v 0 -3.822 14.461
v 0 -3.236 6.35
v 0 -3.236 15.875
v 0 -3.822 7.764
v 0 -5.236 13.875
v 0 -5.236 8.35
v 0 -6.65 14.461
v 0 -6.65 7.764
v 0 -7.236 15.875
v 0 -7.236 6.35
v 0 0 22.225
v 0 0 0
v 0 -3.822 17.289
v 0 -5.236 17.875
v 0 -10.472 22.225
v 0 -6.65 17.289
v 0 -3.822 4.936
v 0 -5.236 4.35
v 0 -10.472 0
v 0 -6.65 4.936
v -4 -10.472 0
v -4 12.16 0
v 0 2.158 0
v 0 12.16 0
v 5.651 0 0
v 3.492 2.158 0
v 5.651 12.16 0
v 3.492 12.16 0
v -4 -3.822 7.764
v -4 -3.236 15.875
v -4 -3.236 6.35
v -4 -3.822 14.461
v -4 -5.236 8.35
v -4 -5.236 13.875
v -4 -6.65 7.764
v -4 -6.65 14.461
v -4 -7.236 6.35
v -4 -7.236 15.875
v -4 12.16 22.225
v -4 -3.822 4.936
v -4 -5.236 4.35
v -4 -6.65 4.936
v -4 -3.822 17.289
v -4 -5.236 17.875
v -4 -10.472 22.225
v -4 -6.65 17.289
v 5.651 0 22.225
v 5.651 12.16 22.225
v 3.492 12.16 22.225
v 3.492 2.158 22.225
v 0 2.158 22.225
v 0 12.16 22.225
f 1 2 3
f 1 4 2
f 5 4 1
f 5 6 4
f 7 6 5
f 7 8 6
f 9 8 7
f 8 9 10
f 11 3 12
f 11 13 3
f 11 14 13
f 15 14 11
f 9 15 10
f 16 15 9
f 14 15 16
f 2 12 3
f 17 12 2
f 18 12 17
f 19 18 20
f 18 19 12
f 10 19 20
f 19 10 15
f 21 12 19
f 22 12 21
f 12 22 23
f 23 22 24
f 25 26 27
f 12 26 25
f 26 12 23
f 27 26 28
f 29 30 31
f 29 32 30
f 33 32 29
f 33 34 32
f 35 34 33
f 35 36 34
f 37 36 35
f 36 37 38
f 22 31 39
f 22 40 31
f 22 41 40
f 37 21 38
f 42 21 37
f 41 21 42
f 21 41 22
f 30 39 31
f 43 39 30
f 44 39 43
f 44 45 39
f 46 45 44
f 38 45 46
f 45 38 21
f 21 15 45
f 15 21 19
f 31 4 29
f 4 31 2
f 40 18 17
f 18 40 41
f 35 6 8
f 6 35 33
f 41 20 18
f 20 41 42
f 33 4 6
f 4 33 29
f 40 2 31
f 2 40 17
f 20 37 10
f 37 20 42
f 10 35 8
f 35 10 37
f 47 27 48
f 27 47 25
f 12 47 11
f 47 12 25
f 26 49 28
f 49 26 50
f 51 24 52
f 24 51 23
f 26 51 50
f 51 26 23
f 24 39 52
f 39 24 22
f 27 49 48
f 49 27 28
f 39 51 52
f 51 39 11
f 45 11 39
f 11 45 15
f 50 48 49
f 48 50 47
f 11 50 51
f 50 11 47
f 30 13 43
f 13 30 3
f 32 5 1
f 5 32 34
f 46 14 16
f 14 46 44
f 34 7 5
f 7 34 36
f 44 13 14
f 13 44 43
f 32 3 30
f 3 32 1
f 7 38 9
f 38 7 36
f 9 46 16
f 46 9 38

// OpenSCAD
joinfactor = 0.125;
goldenratio = 1.61803399;

gMaterialThickness = 1/8*25.4;
gMaterialWidth = 3/4*25.4;

gSleeveLength = 1/2*25.4;

gMountRadius = 2;
gMountWidth = gMountRadius*2*goldenratio*goldenratio;
gMountThickness = 4;

//MountTab(gMountThickness, gMountWidth, gSleeveLength, gMountRadius);
//StraightBlank(gMaterialThickness, gMaterialWidth, 1/2*25.4);
//StraightMount(gMaterialThickness, gMaterialWidth, 1/2*25.4, mountgap=3);
//StraightSlipFit(gMaterialThickness, gMaterialWidth, 1/2*25.4, mountgap=3);
//StraightCap(gMaterialThickness, gMaterialWidth, 1/2*25.4, mountgap=3);

//StraightClip(gMaterialThickness, gMaterialWidth, 1/2*25.4, mountgap=3,clipratio=0.5);
StraightRail(gMaterialThickness, gMaterialWidth, 1/2*25.4, mountgap=3,clipratio=0.5);

//=====================================
// Modules
//=====================================

module MountTab(thickness, width, length, radius)
{
	difference()
	{
		cube(size=[thickness, width, length]);
		
		translate([-joinfactor, width/2, length/2])
		rotate([0, 90, 0])
		cylinder(r=radius, h=thickness+2*joinfactor, $fn=8);
	}
}

module StraightBlank(thickness, width, length)
{
	cube(size=[thickness, width, length]);
}

module StraightMount(thickness, width, length, mountgap=3)
{
	InnerThickness = thickness*1.1;
	InnerWidth = width * 1.02;

	OuterThickness = InnerThickness*goldenratio;
	wallthickness = (OuterThickness - InnerThickness);
	OuterWidth = InnerWidth +wallthickness*2;


	union()
	{
		StraightBlank(OuterThickness, OuterWidth, length);
	
		// Add a straight gap that presses against the wall
		translate([-gMountThickness, -joinfactor, 0])
		cube(size=[gMountThickness, OuterWidth+2*joinfactor, length]);
	
		// Add the mounting tabs
		translate([-gMountThickness, OuterWidth, 0])
		MountTab(gMountThickness, gMountWidth, gSleeveLength, gMountRadius);
	
		translate([-gMountThickness, -gMountWidth, 0])
		MountTab(gMountThickness, gMountWidth, gSleeveLength, gMountRadius);
	}
}

module StraightSlipFit(thickness, width, length, mountgap=3)
{
	InnerThickness = thickness*1.1;
	InnerWidth = width * 1.05;

	OuterThickness = InnerThickness*goldenratio;
	wallthickness = (OuterThickness - InnerThickness);
	OuterWidth = InnerWidth +wallthickness*2;


	difference()
	{
		StraightMount(thickness, width, length, mountgap);

		translate([0, wallthickness, -joinfactor])
		StraightBlank(InnerThickness, InnerWidth, length+2*joinfactor);
	}
}

module StraightCap(thickness, width, length, mountgap=3)
{
	InnerThickness = thickness*1.05;
	InnerWidth = width * 1.05;

	OuterThickness = InnerThickness*goldenratio;
	wallthickness = (OuterThickness - InnerThickness);
	OuterWidth = InnerWidth +wallthickness*2;


	difference()
	{
		StraightMount(thickness, width, length, mountgap);

		translate([0, wallthickness, wallthickness])
		StraightBlank(InnerThickness, InnerWidth, length+2*joinfactor);
	}
}

module StraightClip(thickness, width, length, mountgap=3, clipratio=0.5)
{
	InnerThickness = thickness*1.1;
	InnerWidth = width * 1.05;

	OuterThickness = InnerThickness*goldenratio;
	wallthickness = (OuterThickness - InnerThickness);
	OuterWidth = InnerWidth +wallthickness*2;


	difference()
	{
		StraightMount(thickness, width, length, mountgap);

			translate([0, wallthickness, -joinfactor])
			StraightBlank(InnerThickness, InnerWidth, length+2*joinfactor);

			translate([0, wallthickness+InnerWidth*clipratio, -joinfactor])
			StraightBlank(2*InnerThickness, InnerWidth, length+2*joinfactor);
	}
}

module StraightRail(thickness, width, length, mountgap=3, clipratio=0.5)
{
	InnerThickness = thickness*1.1;
	InnerWidth = width * 1.05;

	OuterThickness = InnerThickness*goldenratio;
	wallthickness = (OuterThickness - InnerThickness);
	OuterWidth = InnerWidth +wallthickness*2;

	union()
	{
		difference()
		{
			StraightMount(thickness, width, length, mountgap);
	
				translate([0, wallthickness, -joinfactor])
				StraightBlank(InnerThickness, InnerWidth, length+2*joinfactor);
	
				translate([-2*thickness, wallthickness+InnerWidth*clipratio, -joinfactor])
				StraightBlank(2*InnerThickness+2*thickness,2* InnerWidth, length+2*joinfactor);
		}
	
		translate([0, 0, width/2])
		difference()
		{
			StraightMount(thickness, width, length, mountgap);
	
				translate([0, wallthickness, -joinfactor])
				StraightBlank(InnerThickness, InnerWidth, length+2*joinfactor);
	
				translate([-2*thickness, wallthickness+InnerWidth*clipratio, -joinfactor])
				StraightBlank(2*InnerThickness+2*thickness,2* InnerWidth, length+2*joinfactor);
		}
	}
}
